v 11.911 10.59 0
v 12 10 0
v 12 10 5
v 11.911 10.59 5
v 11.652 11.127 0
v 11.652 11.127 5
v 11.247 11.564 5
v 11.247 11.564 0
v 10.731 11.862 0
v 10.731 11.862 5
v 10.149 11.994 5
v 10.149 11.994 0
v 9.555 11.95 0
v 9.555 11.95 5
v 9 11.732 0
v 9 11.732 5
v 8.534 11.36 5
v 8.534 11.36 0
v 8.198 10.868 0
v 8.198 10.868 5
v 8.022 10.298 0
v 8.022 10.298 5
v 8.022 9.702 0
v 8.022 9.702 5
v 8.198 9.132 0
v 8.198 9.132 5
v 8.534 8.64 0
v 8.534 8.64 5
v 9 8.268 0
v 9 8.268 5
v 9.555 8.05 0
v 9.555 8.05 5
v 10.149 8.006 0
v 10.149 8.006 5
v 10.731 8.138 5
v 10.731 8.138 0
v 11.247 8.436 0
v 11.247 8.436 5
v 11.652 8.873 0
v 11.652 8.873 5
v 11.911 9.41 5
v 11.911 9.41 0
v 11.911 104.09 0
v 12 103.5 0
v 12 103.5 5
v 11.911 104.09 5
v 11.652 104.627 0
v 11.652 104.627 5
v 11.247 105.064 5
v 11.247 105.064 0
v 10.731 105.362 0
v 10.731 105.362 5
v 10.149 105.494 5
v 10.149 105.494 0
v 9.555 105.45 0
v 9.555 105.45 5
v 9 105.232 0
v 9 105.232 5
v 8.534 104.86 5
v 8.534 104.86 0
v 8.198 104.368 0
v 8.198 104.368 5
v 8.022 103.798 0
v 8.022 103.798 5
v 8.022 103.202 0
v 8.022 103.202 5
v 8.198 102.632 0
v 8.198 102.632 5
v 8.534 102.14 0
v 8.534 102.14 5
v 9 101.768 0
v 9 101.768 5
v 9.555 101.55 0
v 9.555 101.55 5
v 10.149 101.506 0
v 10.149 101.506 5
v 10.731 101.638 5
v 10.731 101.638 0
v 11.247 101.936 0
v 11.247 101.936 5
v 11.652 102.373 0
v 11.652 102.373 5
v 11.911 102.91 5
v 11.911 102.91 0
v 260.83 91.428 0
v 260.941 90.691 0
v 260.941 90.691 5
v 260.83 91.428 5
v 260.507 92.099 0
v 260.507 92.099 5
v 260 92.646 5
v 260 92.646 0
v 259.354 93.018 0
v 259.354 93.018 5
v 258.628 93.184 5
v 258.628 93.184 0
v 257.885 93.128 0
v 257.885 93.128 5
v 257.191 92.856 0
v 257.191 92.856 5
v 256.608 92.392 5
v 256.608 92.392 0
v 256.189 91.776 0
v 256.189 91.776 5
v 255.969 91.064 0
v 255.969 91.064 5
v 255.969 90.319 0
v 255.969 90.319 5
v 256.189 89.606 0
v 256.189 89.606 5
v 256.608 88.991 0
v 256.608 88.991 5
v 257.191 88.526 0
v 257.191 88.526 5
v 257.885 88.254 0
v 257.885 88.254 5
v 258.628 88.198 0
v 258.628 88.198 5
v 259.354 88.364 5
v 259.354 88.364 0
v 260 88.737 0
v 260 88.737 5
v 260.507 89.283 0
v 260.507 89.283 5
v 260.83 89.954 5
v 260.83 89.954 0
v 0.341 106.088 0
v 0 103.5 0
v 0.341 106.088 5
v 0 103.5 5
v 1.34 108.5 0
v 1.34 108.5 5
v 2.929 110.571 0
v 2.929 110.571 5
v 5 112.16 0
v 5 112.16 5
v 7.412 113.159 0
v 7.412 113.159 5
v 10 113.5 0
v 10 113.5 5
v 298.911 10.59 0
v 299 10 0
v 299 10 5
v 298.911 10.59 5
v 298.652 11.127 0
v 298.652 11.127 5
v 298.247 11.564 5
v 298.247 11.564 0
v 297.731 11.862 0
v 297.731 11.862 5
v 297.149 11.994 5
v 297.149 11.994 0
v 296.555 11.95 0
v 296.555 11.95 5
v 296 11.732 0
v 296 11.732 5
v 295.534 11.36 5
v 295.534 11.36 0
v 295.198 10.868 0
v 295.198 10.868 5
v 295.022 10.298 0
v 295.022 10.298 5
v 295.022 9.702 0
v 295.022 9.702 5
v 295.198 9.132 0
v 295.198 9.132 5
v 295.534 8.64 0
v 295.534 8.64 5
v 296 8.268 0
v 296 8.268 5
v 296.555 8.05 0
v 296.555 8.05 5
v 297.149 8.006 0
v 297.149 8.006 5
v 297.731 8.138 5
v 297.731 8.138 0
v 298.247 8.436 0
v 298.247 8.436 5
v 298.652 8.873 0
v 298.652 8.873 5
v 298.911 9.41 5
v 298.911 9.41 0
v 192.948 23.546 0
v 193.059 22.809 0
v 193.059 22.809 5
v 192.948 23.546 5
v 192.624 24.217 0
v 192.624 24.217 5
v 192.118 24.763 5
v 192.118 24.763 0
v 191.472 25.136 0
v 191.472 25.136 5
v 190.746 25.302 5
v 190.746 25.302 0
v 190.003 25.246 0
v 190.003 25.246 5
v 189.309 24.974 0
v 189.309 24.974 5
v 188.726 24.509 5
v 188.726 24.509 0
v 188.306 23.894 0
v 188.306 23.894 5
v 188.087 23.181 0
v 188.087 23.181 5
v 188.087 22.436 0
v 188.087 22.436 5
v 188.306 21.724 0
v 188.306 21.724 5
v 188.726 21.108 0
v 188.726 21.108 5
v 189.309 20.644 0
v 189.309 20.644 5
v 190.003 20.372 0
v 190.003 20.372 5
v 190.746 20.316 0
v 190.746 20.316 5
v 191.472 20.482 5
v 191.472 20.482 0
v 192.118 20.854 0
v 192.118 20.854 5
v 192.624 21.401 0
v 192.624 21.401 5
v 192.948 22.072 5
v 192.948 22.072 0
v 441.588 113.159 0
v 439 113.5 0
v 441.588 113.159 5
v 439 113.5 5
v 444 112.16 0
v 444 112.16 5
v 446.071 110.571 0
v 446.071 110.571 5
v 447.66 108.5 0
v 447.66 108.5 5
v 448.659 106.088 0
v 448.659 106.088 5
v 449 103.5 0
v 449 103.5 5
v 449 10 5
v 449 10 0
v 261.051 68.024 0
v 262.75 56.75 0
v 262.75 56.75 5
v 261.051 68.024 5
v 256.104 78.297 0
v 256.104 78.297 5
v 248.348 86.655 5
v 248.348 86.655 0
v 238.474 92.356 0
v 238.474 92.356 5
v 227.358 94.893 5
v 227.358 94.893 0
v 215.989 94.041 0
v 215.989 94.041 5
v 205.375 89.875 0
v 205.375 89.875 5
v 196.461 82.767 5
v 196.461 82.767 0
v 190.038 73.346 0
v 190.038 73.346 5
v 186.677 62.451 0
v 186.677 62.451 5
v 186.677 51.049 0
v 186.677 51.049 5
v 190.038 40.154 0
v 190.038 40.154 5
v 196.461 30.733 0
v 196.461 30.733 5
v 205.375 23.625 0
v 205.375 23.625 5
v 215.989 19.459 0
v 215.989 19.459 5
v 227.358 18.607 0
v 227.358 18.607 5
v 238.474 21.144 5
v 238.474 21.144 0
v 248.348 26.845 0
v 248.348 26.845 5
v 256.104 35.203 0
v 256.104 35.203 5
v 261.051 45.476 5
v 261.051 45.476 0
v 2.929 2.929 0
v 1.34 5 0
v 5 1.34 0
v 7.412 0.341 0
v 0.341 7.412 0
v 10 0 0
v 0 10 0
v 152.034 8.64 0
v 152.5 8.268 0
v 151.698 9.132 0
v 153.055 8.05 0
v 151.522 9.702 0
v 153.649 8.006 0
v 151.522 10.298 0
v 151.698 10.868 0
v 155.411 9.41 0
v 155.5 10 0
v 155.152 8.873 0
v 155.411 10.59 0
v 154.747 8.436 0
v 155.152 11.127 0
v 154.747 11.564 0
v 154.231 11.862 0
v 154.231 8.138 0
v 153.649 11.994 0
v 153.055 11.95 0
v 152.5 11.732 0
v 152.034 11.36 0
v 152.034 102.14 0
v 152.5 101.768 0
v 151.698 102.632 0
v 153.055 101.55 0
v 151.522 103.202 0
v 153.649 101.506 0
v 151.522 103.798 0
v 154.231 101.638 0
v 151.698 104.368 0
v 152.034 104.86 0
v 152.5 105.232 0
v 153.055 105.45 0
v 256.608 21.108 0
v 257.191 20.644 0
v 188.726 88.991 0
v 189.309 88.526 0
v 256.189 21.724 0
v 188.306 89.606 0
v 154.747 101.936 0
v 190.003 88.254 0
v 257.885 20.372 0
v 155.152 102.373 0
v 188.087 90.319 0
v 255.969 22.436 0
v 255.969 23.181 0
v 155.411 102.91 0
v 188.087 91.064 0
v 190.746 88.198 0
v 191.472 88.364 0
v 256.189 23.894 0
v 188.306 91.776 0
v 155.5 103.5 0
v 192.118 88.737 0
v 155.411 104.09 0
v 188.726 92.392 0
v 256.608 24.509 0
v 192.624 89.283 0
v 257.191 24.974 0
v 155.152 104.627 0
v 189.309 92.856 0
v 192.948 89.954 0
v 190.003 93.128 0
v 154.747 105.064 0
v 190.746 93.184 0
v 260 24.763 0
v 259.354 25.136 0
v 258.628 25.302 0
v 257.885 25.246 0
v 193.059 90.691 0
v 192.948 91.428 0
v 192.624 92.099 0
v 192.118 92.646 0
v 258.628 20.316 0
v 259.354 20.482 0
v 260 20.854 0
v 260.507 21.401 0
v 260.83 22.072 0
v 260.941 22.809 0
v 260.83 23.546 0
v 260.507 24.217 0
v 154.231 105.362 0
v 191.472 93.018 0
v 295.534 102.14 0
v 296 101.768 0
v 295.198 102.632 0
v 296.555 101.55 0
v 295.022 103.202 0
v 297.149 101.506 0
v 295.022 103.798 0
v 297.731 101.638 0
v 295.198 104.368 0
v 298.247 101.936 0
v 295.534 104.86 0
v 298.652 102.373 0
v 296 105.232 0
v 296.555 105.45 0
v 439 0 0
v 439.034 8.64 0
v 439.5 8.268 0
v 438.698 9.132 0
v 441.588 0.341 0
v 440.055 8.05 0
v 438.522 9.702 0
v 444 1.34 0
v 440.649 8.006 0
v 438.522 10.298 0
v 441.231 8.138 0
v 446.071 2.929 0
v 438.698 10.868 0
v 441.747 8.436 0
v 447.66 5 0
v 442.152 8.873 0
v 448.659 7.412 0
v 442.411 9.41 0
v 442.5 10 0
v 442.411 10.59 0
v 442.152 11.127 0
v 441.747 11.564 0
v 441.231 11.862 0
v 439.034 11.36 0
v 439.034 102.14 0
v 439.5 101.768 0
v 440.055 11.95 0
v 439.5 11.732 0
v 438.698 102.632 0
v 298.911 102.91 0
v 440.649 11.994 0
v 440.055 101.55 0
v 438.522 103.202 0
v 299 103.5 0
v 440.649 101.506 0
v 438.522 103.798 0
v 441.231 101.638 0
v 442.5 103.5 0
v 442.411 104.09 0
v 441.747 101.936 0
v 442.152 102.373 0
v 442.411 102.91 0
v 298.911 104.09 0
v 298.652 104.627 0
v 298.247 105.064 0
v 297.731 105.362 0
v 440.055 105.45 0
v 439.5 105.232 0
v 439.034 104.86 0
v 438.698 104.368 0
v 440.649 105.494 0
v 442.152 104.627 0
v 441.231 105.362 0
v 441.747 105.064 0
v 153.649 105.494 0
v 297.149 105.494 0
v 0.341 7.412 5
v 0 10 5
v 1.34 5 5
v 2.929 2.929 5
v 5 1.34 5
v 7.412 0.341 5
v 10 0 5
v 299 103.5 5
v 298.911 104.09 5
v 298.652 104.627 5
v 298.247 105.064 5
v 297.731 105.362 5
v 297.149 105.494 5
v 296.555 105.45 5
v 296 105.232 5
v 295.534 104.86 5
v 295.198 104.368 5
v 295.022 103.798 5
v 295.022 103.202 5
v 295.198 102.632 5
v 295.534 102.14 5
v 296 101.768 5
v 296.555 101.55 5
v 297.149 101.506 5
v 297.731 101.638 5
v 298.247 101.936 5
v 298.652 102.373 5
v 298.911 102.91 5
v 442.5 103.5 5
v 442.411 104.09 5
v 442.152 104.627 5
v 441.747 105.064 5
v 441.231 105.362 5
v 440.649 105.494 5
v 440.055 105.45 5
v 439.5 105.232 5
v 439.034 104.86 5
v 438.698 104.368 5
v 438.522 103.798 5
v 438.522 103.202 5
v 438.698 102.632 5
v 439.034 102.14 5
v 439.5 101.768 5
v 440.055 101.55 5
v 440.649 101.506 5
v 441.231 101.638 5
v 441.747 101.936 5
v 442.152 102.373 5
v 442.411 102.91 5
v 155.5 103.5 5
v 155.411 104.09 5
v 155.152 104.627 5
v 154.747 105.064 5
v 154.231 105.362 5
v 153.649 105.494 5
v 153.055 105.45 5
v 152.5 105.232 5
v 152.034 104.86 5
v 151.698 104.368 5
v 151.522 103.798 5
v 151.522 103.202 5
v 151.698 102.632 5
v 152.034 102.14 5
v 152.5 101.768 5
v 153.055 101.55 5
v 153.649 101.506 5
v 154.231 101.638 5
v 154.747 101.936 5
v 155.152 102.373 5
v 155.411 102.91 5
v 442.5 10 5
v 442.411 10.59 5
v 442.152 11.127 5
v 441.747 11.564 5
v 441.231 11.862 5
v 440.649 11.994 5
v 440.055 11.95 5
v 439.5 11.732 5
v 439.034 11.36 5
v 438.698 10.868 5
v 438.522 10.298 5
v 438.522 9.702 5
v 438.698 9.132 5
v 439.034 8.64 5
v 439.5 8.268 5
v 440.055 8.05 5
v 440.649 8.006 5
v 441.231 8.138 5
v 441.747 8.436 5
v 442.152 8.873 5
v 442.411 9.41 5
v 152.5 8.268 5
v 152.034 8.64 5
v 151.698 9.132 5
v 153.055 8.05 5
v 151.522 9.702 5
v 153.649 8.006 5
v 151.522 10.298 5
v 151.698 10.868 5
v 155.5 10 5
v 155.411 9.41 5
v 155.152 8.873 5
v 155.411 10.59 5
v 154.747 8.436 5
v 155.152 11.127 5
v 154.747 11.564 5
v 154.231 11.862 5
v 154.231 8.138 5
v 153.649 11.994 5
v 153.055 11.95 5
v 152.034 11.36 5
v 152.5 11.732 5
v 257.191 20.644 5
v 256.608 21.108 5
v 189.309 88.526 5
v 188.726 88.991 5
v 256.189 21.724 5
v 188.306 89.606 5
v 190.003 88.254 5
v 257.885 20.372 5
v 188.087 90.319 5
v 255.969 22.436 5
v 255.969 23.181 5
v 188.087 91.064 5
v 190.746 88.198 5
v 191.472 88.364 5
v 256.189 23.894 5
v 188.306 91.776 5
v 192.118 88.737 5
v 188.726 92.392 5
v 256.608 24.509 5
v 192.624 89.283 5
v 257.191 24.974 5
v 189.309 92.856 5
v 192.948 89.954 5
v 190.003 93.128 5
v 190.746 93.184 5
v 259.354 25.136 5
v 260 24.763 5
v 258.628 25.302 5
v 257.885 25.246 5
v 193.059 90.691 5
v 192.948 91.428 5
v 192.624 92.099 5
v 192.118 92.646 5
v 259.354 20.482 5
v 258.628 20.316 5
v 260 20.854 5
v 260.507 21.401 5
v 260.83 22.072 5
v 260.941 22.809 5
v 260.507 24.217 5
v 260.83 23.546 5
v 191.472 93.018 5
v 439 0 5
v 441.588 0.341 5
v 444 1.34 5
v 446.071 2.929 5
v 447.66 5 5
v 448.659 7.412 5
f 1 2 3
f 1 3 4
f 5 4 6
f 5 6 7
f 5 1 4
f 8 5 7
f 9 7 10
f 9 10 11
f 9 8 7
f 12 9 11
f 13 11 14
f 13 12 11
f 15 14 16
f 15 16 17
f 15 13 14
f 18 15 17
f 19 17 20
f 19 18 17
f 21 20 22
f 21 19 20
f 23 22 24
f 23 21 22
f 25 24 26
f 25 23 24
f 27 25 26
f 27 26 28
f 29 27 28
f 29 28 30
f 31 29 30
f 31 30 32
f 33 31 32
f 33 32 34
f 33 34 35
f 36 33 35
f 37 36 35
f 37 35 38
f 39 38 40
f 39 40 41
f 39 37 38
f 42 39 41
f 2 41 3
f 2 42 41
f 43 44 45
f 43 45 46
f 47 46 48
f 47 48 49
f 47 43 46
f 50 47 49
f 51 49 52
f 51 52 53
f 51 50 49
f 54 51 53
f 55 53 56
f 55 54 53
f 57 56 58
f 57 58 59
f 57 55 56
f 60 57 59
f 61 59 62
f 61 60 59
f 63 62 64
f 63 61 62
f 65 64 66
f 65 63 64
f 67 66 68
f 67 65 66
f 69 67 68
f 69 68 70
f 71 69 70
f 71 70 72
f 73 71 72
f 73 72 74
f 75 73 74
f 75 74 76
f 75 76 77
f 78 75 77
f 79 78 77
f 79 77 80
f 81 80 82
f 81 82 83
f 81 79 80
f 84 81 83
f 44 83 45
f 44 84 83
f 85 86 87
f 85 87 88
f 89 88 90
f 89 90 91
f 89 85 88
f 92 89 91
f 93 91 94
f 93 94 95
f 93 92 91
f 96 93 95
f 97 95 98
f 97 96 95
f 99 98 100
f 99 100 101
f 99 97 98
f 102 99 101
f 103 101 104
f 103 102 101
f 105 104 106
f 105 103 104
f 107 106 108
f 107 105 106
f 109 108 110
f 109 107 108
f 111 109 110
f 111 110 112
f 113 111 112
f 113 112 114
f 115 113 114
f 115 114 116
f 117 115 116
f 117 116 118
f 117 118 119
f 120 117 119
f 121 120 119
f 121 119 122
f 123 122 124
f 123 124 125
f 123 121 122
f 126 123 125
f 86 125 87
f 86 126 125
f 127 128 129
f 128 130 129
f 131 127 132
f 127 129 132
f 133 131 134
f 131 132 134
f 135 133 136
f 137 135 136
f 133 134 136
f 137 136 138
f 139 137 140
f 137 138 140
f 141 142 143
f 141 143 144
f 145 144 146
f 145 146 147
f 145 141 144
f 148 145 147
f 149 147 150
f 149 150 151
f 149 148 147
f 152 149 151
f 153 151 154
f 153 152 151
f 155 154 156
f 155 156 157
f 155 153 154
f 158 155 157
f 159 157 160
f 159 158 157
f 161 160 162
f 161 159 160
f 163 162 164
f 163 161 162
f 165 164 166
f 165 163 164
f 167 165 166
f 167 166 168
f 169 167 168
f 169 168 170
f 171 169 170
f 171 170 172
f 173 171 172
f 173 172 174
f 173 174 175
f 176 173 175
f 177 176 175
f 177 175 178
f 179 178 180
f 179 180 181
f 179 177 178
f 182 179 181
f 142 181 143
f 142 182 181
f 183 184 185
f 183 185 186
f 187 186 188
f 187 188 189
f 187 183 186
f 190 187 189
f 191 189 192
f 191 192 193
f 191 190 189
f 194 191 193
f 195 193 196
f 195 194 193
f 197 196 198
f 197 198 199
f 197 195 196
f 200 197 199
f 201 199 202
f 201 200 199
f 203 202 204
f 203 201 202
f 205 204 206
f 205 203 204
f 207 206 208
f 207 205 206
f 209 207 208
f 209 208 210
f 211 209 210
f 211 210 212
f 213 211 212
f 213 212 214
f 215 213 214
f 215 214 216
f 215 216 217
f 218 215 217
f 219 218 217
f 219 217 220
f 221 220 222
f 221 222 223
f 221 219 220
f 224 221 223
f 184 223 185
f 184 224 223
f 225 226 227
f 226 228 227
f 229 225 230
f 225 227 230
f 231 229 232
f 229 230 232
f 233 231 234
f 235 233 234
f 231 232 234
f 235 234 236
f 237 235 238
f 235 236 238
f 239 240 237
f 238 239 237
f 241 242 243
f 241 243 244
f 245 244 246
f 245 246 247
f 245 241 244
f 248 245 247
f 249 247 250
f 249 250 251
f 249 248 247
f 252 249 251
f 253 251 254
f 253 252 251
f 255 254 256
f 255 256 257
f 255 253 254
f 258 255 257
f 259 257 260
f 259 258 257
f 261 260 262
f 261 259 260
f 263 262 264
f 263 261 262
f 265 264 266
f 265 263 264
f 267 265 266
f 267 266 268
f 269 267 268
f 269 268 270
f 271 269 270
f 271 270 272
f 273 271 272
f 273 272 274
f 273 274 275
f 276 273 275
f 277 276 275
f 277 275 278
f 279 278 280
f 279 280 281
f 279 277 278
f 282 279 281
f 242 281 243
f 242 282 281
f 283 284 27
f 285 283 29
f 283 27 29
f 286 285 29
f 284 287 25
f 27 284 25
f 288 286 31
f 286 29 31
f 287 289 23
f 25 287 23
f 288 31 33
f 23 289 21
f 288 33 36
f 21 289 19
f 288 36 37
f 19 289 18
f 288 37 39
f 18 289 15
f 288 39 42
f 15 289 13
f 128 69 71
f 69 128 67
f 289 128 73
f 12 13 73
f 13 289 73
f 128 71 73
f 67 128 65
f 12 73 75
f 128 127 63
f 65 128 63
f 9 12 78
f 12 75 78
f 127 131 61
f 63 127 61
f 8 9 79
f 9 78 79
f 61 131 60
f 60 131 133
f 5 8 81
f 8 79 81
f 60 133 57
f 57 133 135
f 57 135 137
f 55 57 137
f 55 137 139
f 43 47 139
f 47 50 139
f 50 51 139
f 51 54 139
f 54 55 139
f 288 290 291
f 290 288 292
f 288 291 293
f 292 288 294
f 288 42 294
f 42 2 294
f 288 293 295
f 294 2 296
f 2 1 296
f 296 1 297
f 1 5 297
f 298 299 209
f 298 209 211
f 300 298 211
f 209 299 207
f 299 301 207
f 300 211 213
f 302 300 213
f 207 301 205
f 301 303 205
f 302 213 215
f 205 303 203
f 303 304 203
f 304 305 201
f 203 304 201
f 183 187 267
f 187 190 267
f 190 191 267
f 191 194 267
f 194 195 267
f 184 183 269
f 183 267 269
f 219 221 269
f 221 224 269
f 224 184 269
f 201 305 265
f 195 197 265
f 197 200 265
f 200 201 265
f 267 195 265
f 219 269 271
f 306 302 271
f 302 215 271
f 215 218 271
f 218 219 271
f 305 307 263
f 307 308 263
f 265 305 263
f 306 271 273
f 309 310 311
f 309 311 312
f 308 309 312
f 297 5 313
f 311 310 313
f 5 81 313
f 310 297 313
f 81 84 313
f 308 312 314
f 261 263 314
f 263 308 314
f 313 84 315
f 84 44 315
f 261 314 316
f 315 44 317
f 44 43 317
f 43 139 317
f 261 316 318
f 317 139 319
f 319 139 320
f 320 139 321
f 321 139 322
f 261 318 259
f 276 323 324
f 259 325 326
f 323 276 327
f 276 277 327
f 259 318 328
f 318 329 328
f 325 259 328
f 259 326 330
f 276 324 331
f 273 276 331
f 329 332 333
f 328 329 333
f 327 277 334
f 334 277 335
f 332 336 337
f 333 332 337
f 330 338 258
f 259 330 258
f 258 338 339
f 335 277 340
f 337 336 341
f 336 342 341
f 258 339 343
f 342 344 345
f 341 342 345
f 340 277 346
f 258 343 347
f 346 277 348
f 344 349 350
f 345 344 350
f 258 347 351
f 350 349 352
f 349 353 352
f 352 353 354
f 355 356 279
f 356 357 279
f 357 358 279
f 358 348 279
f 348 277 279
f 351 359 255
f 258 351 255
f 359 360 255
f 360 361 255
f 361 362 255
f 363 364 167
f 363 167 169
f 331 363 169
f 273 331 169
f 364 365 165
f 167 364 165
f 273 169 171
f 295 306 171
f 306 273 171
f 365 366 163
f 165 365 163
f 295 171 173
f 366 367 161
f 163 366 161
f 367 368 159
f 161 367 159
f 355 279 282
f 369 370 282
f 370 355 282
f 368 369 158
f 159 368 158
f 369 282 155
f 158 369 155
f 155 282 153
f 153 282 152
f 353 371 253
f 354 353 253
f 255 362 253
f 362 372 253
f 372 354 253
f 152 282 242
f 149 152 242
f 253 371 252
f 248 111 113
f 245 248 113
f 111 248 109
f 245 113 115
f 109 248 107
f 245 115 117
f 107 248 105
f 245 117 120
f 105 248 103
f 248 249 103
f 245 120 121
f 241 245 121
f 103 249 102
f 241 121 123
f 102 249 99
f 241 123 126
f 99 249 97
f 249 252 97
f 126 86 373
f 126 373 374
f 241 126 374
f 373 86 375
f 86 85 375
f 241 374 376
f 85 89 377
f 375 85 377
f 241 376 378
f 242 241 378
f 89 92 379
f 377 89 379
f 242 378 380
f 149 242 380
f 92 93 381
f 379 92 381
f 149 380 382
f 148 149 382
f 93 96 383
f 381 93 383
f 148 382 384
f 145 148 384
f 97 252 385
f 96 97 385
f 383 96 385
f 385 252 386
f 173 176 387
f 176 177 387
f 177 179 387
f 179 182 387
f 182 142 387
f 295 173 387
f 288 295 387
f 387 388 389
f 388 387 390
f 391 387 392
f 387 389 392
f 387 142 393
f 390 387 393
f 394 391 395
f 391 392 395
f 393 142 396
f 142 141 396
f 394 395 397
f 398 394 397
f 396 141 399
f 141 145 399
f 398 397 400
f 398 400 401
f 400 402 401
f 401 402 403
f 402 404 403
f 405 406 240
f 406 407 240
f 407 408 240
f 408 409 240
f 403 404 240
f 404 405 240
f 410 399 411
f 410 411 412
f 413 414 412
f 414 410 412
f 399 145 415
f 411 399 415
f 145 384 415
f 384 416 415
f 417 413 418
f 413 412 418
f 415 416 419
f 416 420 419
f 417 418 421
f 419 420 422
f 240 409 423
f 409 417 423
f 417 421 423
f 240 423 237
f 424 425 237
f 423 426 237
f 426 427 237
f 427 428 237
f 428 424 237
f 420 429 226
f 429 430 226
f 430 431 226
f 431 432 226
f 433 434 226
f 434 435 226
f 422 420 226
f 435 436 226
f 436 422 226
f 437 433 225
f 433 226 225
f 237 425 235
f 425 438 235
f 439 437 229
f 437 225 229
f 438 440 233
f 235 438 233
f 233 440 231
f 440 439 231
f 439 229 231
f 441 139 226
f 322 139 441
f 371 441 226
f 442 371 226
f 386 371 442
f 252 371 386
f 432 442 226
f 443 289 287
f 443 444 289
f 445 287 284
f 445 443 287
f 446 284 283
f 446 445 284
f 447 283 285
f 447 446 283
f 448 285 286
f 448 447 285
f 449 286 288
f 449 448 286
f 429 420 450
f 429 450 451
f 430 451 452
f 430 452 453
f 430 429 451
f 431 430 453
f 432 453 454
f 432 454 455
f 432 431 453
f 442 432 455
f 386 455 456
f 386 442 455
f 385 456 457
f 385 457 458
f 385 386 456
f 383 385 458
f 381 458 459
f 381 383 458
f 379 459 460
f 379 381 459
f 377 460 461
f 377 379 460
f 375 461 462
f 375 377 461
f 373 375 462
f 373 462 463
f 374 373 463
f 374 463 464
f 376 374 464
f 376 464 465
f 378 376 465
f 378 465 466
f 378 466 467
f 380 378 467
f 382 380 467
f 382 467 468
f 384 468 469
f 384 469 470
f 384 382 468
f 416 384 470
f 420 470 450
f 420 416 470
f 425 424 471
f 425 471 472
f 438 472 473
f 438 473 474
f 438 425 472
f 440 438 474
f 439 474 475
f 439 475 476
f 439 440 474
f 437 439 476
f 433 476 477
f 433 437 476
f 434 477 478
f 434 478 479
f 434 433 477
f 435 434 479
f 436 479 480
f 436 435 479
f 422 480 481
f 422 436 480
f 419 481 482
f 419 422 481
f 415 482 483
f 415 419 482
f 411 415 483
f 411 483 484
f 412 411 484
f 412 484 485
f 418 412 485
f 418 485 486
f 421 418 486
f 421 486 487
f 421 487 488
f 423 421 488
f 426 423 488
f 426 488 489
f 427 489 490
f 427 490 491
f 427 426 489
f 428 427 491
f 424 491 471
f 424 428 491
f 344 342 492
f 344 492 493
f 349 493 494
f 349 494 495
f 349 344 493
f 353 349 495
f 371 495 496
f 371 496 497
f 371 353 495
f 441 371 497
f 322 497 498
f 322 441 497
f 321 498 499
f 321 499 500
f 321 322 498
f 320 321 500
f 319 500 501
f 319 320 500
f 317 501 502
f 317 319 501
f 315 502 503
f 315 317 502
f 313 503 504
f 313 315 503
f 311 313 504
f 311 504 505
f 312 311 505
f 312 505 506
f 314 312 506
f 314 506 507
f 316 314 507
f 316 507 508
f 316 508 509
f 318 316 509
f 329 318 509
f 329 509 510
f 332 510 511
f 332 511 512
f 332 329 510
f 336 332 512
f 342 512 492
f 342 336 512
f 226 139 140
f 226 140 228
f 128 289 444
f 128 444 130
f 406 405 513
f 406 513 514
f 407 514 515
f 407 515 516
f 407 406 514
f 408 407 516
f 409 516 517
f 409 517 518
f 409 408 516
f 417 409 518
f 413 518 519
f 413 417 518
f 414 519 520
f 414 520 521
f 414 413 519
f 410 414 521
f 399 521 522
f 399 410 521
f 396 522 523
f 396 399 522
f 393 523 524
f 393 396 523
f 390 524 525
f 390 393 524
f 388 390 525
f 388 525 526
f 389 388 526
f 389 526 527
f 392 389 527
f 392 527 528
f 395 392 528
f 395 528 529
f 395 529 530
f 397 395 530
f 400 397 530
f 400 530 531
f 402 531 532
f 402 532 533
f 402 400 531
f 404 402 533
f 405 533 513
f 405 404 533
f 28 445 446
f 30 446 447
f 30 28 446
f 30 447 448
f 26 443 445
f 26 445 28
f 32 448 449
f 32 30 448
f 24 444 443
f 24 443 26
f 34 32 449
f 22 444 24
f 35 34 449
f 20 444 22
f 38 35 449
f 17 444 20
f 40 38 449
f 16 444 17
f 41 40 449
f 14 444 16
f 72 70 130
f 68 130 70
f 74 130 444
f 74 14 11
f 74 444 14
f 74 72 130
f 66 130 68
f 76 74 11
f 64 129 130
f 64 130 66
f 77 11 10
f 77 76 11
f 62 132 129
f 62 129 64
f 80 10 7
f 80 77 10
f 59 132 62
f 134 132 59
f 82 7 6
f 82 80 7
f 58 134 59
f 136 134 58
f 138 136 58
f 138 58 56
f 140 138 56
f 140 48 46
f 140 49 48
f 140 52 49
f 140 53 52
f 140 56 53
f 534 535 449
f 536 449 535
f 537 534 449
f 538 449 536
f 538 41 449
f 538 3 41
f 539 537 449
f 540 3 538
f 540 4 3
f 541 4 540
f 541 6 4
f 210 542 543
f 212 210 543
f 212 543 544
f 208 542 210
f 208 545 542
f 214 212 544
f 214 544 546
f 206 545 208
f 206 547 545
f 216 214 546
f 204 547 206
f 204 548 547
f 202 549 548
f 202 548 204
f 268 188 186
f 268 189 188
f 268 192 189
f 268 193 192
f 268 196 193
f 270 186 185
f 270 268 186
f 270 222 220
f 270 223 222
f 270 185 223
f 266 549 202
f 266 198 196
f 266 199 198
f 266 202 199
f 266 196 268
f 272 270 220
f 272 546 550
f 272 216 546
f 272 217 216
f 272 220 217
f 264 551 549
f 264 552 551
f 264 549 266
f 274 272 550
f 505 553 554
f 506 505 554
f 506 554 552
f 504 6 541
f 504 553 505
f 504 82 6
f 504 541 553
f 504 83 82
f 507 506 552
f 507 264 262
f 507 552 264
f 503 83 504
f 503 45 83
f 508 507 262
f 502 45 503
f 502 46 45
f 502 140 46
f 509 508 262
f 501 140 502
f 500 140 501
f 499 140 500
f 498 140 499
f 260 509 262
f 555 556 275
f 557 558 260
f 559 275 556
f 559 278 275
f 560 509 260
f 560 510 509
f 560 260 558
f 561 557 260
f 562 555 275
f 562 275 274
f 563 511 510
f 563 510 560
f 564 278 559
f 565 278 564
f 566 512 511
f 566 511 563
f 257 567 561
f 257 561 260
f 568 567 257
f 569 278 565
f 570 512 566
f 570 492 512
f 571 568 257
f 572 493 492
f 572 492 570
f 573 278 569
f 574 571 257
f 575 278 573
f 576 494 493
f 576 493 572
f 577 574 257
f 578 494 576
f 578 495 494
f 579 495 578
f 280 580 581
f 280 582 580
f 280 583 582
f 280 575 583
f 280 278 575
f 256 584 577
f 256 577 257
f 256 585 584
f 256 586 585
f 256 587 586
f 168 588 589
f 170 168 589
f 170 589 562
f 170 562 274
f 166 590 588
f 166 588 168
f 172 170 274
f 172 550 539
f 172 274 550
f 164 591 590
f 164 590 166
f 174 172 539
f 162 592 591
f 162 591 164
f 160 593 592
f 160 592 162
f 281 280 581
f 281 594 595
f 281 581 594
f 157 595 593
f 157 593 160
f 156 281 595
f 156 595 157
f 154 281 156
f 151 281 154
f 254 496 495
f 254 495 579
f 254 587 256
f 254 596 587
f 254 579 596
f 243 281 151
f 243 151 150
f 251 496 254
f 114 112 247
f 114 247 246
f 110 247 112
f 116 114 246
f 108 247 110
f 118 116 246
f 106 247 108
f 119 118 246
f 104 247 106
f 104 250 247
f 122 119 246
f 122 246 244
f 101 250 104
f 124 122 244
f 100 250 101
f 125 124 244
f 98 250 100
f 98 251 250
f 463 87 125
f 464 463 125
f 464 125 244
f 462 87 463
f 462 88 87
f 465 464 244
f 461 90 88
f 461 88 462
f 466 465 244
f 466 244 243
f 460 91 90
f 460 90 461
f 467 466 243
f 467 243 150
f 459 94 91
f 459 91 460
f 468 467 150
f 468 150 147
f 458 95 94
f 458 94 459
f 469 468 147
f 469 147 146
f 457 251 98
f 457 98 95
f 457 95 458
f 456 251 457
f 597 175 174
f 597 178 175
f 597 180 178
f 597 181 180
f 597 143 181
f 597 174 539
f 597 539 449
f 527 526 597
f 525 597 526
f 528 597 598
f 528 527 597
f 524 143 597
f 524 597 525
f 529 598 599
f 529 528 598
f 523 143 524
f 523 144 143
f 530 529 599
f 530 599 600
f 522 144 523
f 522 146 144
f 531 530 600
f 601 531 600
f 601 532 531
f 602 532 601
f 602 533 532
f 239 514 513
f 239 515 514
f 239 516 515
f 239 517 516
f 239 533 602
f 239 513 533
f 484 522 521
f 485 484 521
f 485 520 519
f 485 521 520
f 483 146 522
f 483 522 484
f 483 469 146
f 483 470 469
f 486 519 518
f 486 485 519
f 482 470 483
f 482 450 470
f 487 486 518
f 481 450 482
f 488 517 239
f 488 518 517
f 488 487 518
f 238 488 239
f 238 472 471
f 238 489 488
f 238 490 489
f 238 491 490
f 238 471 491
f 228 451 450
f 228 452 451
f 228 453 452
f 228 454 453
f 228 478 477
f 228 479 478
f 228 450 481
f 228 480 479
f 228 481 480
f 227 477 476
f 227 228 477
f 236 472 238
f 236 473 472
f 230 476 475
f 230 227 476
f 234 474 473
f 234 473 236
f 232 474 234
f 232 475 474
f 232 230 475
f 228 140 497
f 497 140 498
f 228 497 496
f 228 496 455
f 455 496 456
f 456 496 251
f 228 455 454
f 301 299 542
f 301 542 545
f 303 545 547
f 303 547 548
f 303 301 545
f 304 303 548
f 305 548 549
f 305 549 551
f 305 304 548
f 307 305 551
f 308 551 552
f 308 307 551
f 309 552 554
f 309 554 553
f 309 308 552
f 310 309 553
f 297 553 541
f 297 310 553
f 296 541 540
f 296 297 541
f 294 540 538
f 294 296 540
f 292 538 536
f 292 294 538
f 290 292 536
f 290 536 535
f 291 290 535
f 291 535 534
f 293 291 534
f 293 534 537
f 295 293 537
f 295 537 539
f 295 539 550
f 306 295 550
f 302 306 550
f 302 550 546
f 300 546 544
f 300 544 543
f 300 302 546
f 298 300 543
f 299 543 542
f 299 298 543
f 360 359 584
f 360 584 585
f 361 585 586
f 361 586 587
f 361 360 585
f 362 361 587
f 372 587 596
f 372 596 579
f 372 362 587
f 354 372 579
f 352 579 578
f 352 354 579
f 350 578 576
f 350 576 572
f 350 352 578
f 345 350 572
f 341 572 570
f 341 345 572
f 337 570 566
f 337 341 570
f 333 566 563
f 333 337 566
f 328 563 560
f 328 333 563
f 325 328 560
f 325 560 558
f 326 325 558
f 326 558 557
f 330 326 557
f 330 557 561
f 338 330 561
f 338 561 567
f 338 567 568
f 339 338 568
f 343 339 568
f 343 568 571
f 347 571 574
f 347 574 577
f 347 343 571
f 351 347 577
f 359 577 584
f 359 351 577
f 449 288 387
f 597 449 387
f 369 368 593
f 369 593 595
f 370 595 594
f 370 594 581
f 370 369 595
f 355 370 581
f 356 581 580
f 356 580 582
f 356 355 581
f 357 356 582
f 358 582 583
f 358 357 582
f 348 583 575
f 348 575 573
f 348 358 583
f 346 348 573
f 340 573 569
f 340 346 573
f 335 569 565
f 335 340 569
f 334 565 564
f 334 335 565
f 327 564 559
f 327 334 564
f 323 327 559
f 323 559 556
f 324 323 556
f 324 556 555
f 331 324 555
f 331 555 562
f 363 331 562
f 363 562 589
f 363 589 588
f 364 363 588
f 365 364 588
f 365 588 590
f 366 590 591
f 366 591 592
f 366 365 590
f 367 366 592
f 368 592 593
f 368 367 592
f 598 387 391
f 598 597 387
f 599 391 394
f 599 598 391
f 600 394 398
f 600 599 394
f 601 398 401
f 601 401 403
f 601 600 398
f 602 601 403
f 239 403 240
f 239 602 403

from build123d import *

# Parameters (mm, degrees)
ESQUISSE1_W        = 449
ESQUISSE1_H        = 113.5
ESQUISSE1_R        = 2
ESQUISSE1_R_2      = 38.25
ESQUISSE1_R_3      = 2.5
BOSS_EXTRU_1_DEPTH = 5
CONG_1_R           = 10


with BuildPart() as part:
    # Esquisse1 → Boss.-Extru.1 (new body)
    with BuildSketch(Plane.XY):
        with Locations((224.5, 56.75)):
            Rectangle(ESQUISSE1_W, ESQUISSE1_H)
        with Locations((10, 10)):
            Circle(ESQUISSE1_R, mode=Mode.SUBTRACT)
        with Locations((153.5, 10)):
            Circle(ESQUISSE1_R, mode=Mode.SUBTRACT)
        with Locations((297, 10)):
            Circle(ESQUISSE1_R, mode=Mode.SUBTRACT)
        with Locations((440.5, 10)):
            Circle(ESQUISSE1_R, mode=Mode.SUBTRACT)
        with Locations((153.5, 103.5)):
            Circle(ESQUISSE1_R, mode=Mode.SUBTRACT)
        with Locations((297, 103.5)):
            Circle(ESQUISSE1_R, mode=Mode.SUBTRACT)
        with Locations((440.5, 103.5)):
            Circle(ESQUISSE1_R, mode=Mode.SUBTRACT)
        with Locations((10, 103.5)):
            Circle(ESQUISSE1_R, mode=Mode.SUBTRACT)
        with Locations((224.5, 56.75)):
            Circle(ESQUISSE1_R_2, mode=Mode.SUBTRACT)
        with Locations((258.441125497, 90.691125497)):
            Circle(ESQUISSE1_R_3, mode=Mode.SUBTRACT)
        with Locations((258.441125497, 22.808874503)):
            Circle(ESQUISSE1_R_3, mode=Mode.SUBTRACT)
        with Locations((190.558874503, 22.808874503)):
            Circle(ESQUISSE1_R_3, mode=Mode.SUBTRACT)
        with Locations((190.558874503, 90.691125497)):
            Circle(ESQUISSE1_R_3, mode=Mode.SUBTRACT)
    extrude(amount=BOSS_EXTRU_1_DEPTH)

    # Congé1
    cong_1_edges = [part.edges().sort_by_distance(p)[0] for p in [
        (0, 113.5, 2.5),
        (449, 113.5, 2.5),
        (449, 0, 2.5),
        (0, 0, 2.5),
    ]]
    fillet(cong_1_edges, radius=CONG_1_R)


solid = part.part
